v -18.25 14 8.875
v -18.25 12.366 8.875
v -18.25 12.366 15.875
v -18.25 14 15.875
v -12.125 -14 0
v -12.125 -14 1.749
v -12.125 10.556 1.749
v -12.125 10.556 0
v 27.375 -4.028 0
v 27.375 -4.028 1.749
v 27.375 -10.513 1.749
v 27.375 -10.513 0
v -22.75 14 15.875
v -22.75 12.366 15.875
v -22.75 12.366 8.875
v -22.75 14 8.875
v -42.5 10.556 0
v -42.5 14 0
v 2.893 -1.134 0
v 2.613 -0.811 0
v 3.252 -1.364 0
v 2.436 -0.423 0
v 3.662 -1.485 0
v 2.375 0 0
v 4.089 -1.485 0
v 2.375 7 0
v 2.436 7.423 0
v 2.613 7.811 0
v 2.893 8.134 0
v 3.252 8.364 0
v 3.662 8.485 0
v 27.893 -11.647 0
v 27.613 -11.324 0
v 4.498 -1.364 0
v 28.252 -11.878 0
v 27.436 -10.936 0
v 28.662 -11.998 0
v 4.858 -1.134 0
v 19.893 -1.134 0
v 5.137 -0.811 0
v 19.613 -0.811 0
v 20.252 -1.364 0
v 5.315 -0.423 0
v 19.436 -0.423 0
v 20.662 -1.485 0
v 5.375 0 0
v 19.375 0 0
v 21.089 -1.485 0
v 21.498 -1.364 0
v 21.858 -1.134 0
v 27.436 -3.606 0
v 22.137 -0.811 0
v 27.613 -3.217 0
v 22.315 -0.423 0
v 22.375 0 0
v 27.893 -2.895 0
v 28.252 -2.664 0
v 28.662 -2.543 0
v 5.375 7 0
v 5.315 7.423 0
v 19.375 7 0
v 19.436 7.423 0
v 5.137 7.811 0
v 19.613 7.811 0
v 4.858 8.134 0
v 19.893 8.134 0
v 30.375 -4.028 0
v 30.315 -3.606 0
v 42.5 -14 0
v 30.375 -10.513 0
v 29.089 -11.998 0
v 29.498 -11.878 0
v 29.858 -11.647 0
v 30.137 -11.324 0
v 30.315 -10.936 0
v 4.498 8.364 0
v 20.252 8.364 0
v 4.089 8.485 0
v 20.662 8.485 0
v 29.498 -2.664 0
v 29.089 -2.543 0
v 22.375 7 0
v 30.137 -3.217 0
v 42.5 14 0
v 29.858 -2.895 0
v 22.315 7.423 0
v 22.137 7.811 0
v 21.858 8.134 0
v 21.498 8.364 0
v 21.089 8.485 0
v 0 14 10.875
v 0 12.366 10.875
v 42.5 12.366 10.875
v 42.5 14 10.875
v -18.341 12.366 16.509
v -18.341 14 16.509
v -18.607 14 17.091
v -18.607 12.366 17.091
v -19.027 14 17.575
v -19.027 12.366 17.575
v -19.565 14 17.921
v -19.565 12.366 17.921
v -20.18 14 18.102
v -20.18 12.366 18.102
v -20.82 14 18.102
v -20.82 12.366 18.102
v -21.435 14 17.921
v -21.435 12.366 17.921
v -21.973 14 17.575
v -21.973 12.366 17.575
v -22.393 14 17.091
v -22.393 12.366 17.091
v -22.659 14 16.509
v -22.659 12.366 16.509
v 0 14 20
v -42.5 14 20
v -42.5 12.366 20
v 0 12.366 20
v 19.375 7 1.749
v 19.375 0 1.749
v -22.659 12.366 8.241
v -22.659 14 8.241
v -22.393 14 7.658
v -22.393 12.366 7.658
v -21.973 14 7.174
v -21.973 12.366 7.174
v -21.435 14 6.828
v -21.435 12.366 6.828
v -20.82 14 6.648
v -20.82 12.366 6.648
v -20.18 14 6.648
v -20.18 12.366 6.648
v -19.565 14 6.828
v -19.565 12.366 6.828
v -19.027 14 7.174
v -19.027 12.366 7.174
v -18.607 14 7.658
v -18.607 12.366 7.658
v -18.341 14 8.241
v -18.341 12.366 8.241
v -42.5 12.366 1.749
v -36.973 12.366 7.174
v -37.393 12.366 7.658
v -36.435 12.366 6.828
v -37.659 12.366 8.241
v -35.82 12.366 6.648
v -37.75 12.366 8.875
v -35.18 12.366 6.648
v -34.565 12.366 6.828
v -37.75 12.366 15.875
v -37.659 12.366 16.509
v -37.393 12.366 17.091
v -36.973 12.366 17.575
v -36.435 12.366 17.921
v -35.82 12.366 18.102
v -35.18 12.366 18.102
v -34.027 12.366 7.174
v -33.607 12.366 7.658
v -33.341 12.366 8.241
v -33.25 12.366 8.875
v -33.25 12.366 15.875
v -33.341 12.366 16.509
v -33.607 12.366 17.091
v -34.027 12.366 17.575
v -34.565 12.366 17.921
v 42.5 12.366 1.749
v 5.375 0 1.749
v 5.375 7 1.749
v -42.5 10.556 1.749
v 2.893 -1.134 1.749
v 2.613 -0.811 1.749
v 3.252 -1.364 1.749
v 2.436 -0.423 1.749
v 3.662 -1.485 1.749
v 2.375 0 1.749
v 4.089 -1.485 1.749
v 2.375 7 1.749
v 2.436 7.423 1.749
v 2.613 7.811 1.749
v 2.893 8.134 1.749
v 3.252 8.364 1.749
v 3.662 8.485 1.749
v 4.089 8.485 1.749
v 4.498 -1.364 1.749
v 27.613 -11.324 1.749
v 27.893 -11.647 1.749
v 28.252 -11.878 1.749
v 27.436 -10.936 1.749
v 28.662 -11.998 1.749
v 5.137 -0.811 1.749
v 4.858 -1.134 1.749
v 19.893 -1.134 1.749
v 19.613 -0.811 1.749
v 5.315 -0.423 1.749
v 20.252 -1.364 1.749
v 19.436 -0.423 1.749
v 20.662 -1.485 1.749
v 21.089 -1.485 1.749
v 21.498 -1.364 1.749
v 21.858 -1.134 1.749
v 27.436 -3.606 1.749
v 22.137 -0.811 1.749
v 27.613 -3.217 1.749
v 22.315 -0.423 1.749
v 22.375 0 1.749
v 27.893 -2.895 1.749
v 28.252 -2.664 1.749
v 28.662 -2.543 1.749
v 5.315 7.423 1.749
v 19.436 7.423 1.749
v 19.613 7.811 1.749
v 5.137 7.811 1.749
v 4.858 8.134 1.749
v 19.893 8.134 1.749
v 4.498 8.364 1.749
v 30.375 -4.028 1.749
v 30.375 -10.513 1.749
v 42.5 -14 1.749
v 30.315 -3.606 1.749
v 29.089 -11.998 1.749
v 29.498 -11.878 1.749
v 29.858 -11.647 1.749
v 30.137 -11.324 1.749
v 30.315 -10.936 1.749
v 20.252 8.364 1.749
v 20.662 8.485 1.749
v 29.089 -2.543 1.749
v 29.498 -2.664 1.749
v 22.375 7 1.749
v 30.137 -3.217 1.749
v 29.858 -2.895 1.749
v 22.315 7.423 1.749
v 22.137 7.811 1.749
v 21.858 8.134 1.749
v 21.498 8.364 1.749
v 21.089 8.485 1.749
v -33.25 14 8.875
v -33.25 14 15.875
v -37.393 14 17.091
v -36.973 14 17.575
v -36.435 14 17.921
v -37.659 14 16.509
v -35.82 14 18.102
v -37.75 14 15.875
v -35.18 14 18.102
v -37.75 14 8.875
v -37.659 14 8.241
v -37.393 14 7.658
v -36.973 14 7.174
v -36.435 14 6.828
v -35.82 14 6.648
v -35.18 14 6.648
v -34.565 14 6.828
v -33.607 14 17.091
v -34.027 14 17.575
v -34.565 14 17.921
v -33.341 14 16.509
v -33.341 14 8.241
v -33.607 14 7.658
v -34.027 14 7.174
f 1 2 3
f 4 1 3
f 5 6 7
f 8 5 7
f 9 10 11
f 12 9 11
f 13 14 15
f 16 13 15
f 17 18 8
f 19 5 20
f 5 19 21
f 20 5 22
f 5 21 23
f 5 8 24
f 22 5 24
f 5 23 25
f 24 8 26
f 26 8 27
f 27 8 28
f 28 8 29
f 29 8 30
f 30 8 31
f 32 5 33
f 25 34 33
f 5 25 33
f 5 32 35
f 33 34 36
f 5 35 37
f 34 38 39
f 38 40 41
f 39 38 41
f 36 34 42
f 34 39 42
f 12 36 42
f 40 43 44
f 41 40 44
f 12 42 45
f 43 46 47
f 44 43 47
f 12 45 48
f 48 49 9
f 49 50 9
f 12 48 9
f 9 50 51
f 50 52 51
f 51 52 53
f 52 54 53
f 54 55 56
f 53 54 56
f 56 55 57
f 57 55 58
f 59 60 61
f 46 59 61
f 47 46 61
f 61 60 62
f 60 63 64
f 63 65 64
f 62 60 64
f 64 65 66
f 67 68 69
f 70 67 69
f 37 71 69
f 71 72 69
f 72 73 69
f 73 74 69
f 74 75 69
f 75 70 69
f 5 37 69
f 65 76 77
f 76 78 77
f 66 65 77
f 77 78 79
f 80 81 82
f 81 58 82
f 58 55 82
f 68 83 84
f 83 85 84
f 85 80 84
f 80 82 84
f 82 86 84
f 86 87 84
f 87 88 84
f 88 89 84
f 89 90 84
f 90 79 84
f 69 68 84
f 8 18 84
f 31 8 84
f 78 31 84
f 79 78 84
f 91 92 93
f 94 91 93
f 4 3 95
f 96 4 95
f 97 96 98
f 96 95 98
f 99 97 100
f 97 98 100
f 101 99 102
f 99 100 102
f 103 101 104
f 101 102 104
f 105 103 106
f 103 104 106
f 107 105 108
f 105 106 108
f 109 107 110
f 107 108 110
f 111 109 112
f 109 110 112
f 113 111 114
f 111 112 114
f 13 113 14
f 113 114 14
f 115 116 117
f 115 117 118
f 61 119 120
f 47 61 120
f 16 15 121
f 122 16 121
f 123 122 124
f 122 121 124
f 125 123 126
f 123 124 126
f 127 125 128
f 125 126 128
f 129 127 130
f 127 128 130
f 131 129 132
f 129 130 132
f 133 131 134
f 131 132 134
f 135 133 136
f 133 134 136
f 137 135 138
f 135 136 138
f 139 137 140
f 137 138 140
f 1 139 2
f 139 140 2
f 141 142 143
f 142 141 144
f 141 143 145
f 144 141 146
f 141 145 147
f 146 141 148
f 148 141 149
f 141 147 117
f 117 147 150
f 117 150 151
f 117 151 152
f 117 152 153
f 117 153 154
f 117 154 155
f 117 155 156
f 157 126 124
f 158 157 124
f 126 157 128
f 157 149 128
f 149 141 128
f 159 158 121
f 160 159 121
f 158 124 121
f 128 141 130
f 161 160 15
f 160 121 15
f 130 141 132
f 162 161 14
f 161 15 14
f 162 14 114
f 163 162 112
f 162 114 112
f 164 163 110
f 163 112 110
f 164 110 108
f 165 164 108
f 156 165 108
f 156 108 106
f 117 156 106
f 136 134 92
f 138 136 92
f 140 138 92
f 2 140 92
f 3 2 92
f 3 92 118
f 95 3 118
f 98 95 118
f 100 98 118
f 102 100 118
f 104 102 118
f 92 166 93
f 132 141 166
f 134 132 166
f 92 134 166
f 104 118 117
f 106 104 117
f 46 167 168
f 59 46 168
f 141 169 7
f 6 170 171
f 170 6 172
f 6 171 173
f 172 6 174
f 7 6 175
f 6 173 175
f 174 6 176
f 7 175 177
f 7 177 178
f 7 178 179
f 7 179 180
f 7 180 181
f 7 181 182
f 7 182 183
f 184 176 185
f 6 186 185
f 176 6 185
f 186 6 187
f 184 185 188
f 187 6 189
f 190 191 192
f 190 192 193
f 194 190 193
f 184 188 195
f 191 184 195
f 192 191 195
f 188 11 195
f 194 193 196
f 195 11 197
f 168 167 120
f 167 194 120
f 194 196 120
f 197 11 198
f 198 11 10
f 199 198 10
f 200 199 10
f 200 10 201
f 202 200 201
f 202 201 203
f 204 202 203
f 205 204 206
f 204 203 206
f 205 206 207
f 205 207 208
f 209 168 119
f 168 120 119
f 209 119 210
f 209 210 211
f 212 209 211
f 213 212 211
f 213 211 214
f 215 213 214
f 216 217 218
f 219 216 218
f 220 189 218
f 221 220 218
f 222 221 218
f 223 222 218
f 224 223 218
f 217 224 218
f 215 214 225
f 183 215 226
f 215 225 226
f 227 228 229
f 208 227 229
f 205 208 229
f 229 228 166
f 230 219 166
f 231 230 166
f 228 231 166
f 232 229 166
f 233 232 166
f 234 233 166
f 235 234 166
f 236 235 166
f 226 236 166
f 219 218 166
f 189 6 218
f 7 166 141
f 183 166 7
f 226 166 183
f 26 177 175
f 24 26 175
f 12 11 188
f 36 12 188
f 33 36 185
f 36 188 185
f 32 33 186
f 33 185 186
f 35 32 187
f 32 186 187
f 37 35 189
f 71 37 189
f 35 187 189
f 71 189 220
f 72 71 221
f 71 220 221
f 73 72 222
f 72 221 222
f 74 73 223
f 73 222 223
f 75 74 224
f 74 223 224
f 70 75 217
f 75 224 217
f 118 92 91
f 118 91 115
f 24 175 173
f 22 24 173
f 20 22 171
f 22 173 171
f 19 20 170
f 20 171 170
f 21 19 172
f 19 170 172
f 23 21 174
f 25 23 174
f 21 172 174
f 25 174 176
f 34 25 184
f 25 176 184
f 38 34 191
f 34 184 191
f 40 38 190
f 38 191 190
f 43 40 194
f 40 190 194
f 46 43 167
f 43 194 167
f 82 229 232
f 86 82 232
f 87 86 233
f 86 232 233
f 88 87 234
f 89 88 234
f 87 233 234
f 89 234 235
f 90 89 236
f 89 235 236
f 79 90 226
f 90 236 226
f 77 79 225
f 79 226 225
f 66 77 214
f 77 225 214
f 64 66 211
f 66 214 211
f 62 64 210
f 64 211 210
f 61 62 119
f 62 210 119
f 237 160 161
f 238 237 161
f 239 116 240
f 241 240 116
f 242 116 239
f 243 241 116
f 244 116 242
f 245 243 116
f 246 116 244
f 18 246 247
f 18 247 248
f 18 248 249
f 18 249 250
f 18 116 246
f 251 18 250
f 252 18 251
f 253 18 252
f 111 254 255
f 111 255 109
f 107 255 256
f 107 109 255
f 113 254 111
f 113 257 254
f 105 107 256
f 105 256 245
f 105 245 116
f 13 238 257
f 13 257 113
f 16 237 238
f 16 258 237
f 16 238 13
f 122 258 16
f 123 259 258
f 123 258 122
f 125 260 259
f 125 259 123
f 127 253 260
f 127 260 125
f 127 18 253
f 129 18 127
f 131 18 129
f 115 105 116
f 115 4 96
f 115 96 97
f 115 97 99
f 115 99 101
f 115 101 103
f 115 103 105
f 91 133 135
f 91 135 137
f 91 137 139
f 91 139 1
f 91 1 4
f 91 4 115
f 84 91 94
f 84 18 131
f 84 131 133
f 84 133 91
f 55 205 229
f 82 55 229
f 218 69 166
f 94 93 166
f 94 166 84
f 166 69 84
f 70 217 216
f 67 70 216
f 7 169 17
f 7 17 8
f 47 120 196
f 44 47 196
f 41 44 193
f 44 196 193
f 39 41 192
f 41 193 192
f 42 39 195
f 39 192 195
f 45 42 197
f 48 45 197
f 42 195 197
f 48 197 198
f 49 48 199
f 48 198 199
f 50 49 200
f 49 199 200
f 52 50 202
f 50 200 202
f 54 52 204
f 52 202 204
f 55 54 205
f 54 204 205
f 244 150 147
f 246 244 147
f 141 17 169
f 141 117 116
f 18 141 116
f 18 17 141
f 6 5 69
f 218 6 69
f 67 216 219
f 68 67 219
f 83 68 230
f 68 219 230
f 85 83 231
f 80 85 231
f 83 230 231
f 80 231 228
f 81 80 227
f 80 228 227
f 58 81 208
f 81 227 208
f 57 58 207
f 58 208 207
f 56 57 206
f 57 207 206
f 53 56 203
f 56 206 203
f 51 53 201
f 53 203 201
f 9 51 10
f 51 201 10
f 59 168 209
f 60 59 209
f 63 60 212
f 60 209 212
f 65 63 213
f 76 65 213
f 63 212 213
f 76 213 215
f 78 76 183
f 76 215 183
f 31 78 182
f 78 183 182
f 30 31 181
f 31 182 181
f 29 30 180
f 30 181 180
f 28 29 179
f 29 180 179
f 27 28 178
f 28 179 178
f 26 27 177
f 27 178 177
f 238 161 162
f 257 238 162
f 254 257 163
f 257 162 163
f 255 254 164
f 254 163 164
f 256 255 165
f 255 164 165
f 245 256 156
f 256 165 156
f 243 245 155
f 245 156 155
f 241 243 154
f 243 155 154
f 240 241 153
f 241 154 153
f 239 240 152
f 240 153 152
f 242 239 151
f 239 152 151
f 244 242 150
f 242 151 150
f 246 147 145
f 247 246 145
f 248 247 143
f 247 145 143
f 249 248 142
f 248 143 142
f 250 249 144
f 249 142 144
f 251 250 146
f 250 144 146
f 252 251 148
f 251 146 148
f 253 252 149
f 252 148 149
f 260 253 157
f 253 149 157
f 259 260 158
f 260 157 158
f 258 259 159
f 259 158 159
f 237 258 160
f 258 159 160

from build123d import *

# Parameters (mm, degrees)
F0_W      = 85
F0_H      = 28
F1_DEPTH  = 20
F2_W      = 26.3659512028
F2_H      = 18.2506702654
F3_DEPTH  = 121
F4_W      = 30.3753349185
F4_H      = 24.556301102
F5_DEPTH  = 25
F6_W      = 42.5
F6_H      = 9.1253351327
F7_DEPTH  = 25
F9_DEPTH  = 25
F11_DEPTH = 25


with BuildPart() as f1:
    # F0 (on Top) → F1 (new body)
    with BuildSketch(Plane.XY):
        Rectangle(F0_W, F0_H)
    extrude(amount=F1_DEPTH)

    # F2 (on face) → F3 (cut)
    with BuildSketch(Plane.YZ.offset(42.5)):
        with Locations((-0.8170243986, 10.8746648673)):
            Rectangle(F2_W, F2_H)
    extrude(amount=-F3_DEPTH, mode=Mode.SUBTRACT)

    # F4 (on face) → F5 (cut)
    with BuildSketch(Plane.XY.offset(1.7493297346)):
        with Locations((-27.3123325408, -1.721849449)):
            Rectangle(F4_W, F4_H)
    extrude(amount=-F5_DEPTH, mode=Mode.SUBTRACT)

    # F6 (on face) → F7 (cut)
    with BuildSketch(Plane.XZ.offset(-12.3659512028)):
        with Locations((21.25, 15.4373324336)):
            Rectangle(F6_W, F6_H)
    extrude(amount=-F7_DEPTH, mode=Mode.SUBTRACT)

    # F8 (on face) → F9 (cut)
    with BuildSketch(Plane.XZ.offset(-12.3659512028)):
        with BuildLine():
            ThreePointArc((-37.75, 15.8746648673), (-35.5, 13.6246648673), (-33.25, 15.8746648673))
            ThreePointArc((-33.25, 15.8746648673), (-35.5, 18.1246648673), (-37.75, 15.8746648673))
        make_face()
        with BuildLine():
            Line((-33.25, 8.8746648673), (-33.25, 15.8746648673))
            ThreePointArc((-33.25, 15.8746648673), (-35.5, 13.6246648673), (-37.75, 15.8746648673))
            Line((-37.75, 15.8746648673), (-37.75, 8.8746648673))
            ThreePointArc((-37.75, 8.8746648673), (-35.5, 11.1246648673), (-33.25, 8.8746648673))
        make_face()
        with BuildLine():
            ThreePointArc((-37.75, 8.8746648673), (-35.5, 6.6246648673), (-33.25, 8.8746648673))
            ThreePointArc((-33.25, 8.8746648673), (-35.5, 11.1246648673), (-37.75, 8.8746648673))
        make_face()
        with BuildLine():
            ThreePointArc((-22.75, 8.8746648673), (-20.5, 6.6246648673), (-18.25, 8.8746648673))
            ThreePointArc((-18.25, 8.8746648673), (-20.5, 11.1246648673), (-22.75, 8.8746648673))
        make_face()
        with BuildLine():
            ThreePointArc((-22.75, 8.8746648673), (-20.5, 11.1246648673), (-18.25, 8.8746648673))
            Line((-18.25, 8.8746648673), (-18.25, 15.8746648673))
            ThreePointArc((-18.25, 15.8746648673), (-20.5, 13.6246648673), (-22.75, 15.8746648673))
            Line((-22.75, 15.8746648673), (-22.75, 8.8746648673))
        make_face()
        with BuildLine():
            ThreePointArc((-22.75, 15.8746648673), (-20.5, 13.6246648673), (-18.25, 15.8746648673))
            ThreePointArc((-18.25, 15.8746648673), (-20.5, 18.1246648673), (-22.75, 15.8746648673))
        make_face()
    extrude(amount=-F9_DEPTH, mode=Mode.SUBTRACT)

    # F10 (on face) → F11 (cut)
    with BuildSketch(Plane.XY.offset(1.7493297346)):
        with BuildLine():
            ThreePointArc((2.3753349185, 7), (3.8753349185, 5.5), (5.3753349185, 7))
            ThreePointArc((5.3753349185, 7), (3.8753349185, 8.5), (2.3753349185, 7))
        make_face()
        with BuildLine():
            Line((5.3753349185, 0), (5.3753349185, 7))
            ThreePointArc((5.3753349185, 7), (3.8753349185, 5.5), (2.3753349185, 7))
            Line((2.3753349185, 7), (2.3753349185, 0))
            ThreePointArc((2.3753349185, 0), (3.8753349185, 1.5), (5.3753349185, 0))
        make_face()
        with BuildLine():
            ThreePointArc((2.3753349185, 0), (3.8753349185, -1.5), (5.3753349185, 0))
            ThreePointArc((5.3753349185, 0), (3.8753349185, 1.5), (2.3753349185, 0))
        make_face()
        with BuildLine():
            ThreePointArc((19.3753349185, 7), (20.8753349185, 5.5), (22.3753349185, 7))
            ThreePointArc((22.3753349185, 7), (20.8753349185, 8.5), (19.3753349185, 7))
        make_face()
        with BuildLine():
            Line((22.3753349185, 0), (22.3753349185, 7))
            ThreePointArc((22.3753349185, 7), (20.8753349185, 5.5), (19.3753349185, 7))
            Line((19.3753349185, 7), (19.3753349185, 0))
            ThreePointArc((19.3753349185, 0), (20.8753349185, 1.5), (22.3753349185, 0))
        make_face()
        with BuildLine():
            ThreePointArc((19.3753349185, 0), (20.8753349185, -1.5), (22.3753349185, 0))
            ThreePointArc((22.3753349185, 0), (20.8753349185, 1.5), (19.3753349185, 0))
        make_face()
        with BuildLine():
            ThreePointArc((27.3753349185, -4.0281792737), (28.8753349185, -5.5281792737), (30.3753349185, -4.0281792737))
            ThreePointArc((30.3753349185, -4.0281792737), (28.8753349185, -2.5281792737), (27.3753349185, -4.0281792737))
        make_face()
        with BuildLine():
            Line((30.3753349185, -10.5132134631), (30.3753349185, -4.0281792737))
            ThreePointArc((30.3753349185, -4.0281792737), (28.8753349185, -5.5281792737), (27.3753349185, -4.0281792737))
            Line((27.3753349185, -4.0281792737), (27.3753349185, -10.5132134631))
            ThreePointArc((27.3753349185, -10.5132134631), (28.8753349185, -9.0132134631), (30.3753349185, -10.5132134631))
        make_face()
        with BuildLine():
            ThreePointArc((27.3753349185, -10.5132134631), (28.8753349185, -12.0132134631), (30.3753349185, -10.5132134631))
            ThreePointArc((30.3753349185, -10.5132134631), (28.8753349185, -9.0132134631), (27.3753349185, -10.5132134631))
        make_face()
    extrude(amount=-F11_DEPTH, mode=Mode.SUBTRACT)


solid = f1.part
